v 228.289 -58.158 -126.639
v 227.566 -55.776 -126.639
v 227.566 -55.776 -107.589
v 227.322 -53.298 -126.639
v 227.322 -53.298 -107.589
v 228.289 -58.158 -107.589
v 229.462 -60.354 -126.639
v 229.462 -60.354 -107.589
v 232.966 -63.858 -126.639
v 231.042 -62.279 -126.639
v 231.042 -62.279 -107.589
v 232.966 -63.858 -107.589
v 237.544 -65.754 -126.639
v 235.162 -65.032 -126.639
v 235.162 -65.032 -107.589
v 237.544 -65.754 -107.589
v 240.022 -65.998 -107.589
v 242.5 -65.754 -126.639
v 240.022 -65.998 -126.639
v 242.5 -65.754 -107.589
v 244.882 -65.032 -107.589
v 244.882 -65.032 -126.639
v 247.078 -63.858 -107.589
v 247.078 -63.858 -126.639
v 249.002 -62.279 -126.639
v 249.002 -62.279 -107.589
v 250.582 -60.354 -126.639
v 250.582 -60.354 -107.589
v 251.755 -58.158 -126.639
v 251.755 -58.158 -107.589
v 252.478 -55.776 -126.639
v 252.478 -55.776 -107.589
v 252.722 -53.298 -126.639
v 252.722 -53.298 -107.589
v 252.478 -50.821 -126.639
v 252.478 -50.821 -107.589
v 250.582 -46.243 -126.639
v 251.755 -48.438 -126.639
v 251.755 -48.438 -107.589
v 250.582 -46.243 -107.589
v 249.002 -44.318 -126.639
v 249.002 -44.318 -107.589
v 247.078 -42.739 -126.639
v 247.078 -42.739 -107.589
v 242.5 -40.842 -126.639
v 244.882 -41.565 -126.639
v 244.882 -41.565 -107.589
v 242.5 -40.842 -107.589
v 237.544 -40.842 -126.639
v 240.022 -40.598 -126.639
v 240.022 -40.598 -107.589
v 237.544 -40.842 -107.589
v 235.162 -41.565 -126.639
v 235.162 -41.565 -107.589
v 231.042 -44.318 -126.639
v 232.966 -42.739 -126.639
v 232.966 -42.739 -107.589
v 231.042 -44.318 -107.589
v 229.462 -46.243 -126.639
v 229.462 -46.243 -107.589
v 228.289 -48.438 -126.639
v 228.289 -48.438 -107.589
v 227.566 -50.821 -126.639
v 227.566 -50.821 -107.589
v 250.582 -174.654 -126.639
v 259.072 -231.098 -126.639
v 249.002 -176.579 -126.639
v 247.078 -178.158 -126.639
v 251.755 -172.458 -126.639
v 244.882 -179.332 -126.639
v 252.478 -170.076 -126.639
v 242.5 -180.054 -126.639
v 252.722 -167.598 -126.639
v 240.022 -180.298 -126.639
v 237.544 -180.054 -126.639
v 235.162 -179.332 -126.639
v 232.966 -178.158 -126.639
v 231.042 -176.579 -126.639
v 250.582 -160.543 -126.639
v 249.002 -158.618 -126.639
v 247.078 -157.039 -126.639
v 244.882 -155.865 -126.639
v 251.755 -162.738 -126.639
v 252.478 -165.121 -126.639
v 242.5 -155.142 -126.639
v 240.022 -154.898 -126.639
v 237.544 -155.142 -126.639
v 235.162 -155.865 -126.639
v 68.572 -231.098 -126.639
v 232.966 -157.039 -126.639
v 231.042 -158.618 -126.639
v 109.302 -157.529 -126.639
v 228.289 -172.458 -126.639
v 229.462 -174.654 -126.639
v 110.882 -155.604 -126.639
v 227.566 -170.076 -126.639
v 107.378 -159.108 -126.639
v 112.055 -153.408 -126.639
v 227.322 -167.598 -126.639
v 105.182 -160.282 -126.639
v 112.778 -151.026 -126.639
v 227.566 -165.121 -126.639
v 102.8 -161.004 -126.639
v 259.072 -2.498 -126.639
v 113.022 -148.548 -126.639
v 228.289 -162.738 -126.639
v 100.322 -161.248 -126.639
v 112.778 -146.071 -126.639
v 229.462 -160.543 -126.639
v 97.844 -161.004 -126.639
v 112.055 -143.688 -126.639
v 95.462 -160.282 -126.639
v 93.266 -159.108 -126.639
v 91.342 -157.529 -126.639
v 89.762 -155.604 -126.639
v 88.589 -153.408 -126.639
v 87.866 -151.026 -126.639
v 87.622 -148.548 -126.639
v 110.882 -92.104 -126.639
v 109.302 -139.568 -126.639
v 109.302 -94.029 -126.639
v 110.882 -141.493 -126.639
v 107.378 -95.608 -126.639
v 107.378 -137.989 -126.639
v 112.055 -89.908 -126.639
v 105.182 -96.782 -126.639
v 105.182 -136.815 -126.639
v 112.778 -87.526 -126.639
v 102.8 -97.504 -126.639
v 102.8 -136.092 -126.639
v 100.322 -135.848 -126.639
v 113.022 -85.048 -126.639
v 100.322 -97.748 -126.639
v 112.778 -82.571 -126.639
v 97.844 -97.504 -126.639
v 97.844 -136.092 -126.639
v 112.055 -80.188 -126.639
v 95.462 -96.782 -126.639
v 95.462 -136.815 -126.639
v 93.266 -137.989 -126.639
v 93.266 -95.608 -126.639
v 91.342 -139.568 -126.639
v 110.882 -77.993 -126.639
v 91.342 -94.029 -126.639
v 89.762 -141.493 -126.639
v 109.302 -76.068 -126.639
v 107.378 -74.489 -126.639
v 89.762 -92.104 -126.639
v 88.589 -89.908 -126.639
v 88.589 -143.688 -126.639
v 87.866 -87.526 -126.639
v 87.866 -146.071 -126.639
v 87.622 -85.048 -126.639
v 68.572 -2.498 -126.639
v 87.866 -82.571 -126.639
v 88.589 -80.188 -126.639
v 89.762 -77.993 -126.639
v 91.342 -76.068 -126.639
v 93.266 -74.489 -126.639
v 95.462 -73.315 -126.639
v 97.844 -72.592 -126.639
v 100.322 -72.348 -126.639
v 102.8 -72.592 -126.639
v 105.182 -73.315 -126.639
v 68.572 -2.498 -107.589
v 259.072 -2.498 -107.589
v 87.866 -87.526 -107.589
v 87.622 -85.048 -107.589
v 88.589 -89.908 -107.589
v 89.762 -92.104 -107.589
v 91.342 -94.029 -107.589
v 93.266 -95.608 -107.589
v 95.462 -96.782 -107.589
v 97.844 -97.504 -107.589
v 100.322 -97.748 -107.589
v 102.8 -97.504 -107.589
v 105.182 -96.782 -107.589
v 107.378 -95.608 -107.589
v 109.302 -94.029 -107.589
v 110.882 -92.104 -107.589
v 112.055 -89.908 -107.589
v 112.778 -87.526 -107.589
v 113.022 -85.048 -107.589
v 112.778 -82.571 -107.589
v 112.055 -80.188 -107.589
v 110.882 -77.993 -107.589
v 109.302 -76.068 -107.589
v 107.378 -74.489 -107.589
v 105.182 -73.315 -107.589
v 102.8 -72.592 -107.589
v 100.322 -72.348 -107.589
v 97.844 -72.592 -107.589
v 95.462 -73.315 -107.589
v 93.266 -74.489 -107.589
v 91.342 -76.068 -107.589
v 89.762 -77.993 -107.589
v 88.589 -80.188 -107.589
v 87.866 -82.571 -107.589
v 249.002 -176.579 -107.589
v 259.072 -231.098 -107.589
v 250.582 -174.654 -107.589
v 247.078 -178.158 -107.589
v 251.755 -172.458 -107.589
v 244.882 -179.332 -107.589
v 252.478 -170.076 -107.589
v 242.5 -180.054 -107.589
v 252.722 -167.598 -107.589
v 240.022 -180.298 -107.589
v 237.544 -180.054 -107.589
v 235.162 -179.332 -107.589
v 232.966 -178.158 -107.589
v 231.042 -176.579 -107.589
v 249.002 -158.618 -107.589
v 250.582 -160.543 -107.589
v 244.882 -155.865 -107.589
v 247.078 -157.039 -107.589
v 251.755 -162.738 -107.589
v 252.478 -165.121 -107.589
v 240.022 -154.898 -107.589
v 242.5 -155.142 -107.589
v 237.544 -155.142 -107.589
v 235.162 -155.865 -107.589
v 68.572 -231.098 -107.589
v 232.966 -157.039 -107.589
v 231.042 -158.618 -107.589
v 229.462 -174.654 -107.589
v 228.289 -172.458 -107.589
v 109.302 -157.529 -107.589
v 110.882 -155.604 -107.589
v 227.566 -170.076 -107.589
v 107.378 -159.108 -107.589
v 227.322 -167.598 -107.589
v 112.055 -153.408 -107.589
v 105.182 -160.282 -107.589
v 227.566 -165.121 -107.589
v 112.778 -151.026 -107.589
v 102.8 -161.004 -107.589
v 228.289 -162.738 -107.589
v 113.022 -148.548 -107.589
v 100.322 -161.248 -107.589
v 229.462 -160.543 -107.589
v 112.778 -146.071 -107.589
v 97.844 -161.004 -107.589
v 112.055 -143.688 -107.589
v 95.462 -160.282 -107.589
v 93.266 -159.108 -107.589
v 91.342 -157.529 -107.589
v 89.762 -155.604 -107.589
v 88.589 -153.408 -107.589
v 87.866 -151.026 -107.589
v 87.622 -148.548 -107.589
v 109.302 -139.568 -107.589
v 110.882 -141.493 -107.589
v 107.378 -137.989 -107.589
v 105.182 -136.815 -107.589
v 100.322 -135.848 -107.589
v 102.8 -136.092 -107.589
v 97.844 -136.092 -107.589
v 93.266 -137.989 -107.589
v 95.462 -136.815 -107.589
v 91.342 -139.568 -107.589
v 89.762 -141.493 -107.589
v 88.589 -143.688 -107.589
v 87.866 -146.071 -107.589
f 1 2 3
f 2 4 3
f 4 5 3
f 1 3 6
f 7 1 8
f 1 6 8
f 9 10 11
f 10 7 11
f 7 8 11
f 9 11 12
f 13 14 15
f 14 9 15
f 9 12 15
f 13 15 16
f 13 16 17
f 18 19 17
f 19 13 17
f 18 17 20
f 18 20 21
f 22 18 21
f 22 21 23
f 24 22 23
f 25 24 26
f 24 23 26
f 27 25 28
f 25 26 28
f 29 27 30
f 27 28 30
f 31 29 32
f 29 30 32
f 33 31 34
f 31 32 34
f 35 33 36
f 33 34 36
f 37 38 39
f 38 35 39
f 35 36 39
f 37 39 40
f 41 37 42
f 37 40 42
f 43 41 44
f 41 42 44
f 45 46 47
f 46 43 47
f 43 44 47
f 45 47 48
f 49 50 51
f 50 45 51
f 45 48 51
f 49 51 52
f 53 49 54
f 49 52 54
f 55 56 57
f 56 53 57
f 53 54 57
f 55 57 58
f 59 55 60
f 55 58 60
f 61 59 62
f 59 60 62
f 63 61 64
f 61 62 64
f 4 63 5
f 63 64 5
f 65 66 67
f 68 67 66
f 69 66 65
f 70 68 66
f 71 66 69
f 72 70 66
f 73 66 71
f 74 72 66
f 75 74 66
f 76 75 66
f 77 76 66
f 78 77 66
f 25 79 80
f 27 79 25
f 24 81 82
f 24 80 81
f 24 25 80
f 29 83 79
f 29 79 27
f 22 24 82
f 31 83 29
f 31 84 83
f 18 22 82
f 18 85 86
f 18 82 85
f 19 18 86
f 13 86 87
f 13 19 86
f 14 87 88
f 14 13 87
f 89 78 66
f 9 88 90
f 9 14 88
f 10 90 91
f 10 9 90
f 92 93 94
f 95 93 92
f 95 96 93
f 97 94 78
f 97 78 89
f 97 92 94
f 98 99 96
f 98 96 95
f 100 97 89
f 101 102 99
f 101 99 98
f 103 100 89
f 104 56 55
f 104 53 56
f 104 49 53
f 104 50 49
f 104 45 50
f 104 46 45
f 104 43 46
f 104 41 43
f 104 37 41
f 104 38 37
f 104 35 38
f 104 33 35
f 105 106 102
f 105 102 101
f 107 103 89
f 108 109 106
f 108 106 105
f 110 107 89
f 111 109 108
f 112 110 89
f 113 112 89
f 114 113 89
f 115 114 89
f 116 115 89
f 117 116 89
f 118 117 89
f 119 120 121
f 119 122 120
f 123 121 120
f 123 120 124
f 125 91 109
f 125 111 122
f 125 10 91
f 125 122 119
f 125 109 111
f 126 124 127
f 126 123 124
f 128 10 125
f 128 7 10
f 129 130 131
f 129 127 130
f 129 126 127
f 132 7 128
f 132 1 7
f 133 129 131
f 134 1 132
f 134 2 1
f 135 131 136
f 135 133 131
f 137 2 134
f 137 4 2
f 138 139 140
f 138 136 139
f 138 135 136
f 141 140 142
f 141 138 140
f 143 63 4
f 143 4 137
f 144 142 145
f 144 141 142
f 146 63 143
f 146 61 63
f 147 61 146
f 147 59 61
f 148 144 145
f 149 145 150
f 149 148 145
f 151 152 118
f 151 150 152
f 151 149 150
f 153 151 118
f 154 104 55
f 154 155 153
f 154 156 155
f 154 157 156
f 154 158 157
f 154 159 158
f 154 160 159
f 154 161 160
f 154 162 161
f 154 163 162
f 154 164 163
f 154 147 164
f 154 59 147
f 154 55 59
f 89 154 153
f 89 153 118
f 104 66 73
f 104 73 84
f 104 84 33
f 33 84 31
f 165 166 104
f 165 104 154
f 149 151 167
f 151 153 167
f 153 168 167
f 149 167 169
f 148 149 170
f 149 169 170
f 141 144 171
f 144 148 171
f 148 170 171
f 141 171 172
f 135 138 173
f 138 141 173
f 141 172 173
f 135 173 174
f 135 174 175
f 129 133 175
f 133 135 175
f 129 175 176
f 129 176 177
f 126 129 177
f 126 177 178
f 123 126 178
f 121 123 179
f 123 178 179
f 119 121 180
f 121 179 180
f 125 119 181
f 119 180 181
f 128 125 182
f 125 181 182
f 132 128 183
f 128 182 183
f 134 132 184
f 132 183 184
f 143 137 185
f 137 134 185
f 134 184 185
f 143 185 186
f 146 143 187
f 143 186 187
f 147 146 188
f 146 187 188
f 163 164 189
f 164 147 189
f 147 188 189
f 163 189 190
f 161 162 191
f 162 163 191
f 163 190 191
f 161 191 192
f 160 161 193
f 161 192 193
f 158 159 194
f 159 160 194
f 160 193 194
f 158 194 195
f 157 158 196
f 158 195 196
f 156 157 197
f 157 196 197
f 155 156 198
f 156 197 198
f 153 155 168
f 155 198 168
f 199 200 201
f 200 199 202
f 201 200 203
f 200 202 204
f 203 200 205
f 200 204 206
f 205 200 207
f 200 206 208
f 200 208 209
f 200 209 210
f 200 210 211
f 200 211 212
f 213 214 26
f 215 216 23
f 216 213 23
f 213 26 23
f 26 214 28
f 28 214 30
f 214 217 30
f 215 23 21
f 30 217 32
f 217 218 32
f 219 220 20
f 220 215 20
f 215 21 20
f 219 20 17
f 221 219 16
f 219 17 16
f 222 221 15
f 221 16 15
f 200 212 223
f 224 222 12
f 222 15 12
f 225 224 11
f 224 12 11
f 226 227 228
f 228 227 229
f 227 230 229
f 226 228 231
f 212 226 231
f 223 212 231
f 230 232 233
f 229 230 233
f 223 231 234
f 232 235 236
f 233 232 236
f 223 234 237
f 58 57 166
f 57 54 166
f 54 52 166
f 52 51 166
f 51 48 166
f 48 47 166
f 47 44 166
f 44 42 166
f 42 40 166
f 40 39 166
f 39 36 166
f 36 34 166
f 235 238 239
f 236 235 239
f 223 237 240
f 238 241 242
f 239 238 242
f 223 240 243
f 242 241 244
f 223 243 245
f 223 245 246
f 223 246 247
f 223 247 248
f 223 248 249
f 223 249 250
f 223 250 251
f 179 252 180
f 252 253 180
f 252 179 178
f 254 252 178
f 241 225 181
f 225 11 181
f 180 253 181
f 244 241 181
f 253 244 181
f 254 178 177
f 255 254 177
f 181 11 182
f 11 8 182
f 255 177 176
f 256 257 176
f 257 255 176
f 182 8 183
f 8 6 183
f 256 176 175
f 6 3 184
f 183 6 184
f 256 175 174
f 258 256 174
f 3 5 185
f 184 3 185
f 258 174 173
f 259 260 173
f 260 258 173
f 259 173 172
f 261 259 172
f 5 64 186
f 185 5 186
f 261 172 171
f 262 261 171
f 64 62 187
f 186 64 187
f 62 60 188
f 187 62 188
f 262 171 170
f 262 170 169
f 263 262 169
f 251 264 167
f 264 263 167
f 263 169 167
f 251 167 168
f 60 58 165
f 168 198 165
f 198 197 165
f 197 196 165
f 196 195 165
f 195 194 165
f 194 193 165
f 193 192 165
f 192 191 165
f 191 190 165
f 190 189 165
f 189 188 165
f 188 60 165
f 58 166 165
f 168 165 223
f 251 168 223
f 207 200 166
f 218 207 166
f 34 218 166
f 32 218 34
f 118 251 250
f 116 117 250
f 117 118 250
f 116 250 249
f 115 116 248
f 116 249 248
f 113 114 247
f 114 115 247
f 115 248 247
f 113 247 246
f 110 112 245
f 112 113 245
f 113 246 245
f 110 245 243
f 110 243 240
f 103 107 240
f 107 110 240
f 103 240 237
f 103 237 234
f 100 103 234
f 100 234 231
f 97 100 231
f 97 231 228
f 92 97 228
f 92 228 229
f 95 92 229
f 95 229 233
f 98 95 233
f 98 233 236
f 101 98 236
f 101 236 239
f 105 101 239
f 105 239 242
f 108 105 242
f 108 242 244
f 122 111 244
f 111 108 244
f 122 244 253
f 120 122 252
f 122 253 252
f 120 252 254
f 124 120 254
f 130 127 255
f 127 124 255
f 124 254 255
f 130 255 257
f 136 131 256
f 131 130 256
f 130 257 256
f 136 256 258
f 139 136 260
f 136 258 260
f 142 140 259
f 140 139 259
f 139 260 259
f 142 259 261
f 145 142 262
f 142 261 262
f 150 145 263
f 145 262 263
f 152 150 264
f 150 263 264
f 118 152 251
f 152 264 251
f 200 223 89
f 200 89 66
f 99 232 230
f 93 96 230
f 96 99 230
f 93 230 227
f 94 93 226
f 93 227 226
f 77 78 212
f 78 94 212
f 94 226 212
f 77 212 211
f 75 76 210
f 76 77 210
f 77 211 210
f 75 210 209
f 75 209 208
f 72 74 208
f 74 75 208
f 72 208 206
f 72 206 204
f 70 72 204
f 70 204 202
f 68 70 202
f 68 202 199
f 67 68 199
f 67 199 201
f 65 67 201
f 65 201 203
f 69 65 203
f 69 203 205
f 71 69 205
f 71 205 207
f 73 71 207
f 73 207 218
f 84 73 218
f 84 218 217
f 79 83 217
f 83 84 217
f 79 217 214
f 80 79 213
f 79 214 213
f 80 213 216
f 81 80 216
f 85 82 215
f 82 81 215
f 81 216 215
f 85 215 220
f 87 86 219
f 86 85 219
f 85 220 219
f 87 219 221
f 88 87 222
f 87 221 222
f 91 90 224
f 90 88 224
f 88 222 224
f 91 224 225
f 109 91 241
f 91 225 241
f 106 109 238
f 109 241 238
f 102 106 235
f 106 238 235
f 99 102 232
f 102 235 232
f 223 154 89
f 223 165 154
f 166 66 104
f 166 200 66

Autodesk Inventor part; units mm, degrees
ref_plane "YZ Plane" through (0, 0, 0) normal (1, 0, 0) x (0, 1, 0)
ref_plane "XZ Plane" through (0, 0, 0) normal (0, 1, 0) x (-1, 0, 0)
ref_plane "XY Plane" through (0, 0, 0) normal (0, 0, 1) x (1, 0, 0)
ref_plane "Work Plane1" through (163.8219, -116.7983, -107.5891) normal (0, 0, -1) x (-1, 0, 0)
sketch "Sketch1" plane through (163.8219, -116.7983, -107.5891) normal (0, 0, -1) x (-1, 0, 0)
  line L0 (-95.25, 114.3) -> (95.25, 114.3)
  line L1 (95.25, 114.3) -> (95.25, -114.3)
  line L2 (95.25, -114.3) -> (-95.25, -114.3)
  line L3 (-95.25, -114.3) -> (-95.25, 114.3)
  line L4 (-95.25, 114.3) -> (95.25, -114.3) construction
  line L5 (95.25, 114.3) -> (-95.25, -114.3) construction
  arc A0 (44.45, 50.8) -> (25.4, 69.85) centre (25.4, 50.8) ccw construction
  line L6 (25.4, 69.85) -> (-25.4, 69.85) construction
  arc A1 (-25.4, 69.85) -> (-44.45, 50.8) centre (-25.4, 50.8) ccw construction
  line L7 (-44.45, 50.8) -> (-44.45, -50.8) construction
  arc A2 (-44.45, -50.8) -> (-25.4, -69.85) centre (-25.4, -50.8) ccw construction
  line L8 (-25.4, -69.85) -> (25.4, -69.85) construction
  arc A3 (25.4, -69.85) -> (44.45, -50.8) centre (25.4, -50.8) ccw construction
  line L9 (44.45, -50.8) -> (44.45, 50.8) construction
  line L10 (38.1, 50.8) -> (38.1, -50.8) construction
  arc A4 (25.4, -63.5) -> (38.1, -50.8) centre (25.4, -50.8) ccw construction
  line L11 (25.4, -63.5) -> (-25.4, -63.5) construction
  arc A5 (-38.1, -50.8) -> (-25.4, -63.5) centre (-25.4, -50.8) ccw construction
  line L12 (-38.1, -50.8) -> (-38.1, 50.8) construction
  arc A6 (-25.4, 63.5) -> (-38.1, 50.8) centre (-25.4, 50.8) ccw construction
  line L13 (-25.4, 63.5) -> (25.4, 63.5) construction
  arc A7 (38.1, 50.8) -> (25.4, 63.5) centre (25.4, 50.8) ccw construction
  circle A8 centre (-76.2, 63.5) radius 12.7
  circle A9 centre (-76.2, -50.8) radius 12.7
  circle A10 centre (63.5, 31.75) radius 12.7
  circle A11 centre (63.5, -31.75) radius 12.7
  point P0 (163.8219, 116.7983)
  point P1 (0, 0)
  point P2 (0, 63.5)
  point P3 (38.1, 0)
  dimension "d0" = 228.6
  dimension "d1" = 190.5
  dimension "d2" = 25.4
  dimension "d3" = 19.05
  dimension "d4" = 114.3
  dimension "d5" = 63.5
  dimension "d6" = 31.75
  dimension "d7" = 63.5
  dimension "d8" = 82.55
extrude "Extrusion1" add sketch "Sketch1" along normal blind 19.05
properties part number "class2" material "Iron, Ductile"
